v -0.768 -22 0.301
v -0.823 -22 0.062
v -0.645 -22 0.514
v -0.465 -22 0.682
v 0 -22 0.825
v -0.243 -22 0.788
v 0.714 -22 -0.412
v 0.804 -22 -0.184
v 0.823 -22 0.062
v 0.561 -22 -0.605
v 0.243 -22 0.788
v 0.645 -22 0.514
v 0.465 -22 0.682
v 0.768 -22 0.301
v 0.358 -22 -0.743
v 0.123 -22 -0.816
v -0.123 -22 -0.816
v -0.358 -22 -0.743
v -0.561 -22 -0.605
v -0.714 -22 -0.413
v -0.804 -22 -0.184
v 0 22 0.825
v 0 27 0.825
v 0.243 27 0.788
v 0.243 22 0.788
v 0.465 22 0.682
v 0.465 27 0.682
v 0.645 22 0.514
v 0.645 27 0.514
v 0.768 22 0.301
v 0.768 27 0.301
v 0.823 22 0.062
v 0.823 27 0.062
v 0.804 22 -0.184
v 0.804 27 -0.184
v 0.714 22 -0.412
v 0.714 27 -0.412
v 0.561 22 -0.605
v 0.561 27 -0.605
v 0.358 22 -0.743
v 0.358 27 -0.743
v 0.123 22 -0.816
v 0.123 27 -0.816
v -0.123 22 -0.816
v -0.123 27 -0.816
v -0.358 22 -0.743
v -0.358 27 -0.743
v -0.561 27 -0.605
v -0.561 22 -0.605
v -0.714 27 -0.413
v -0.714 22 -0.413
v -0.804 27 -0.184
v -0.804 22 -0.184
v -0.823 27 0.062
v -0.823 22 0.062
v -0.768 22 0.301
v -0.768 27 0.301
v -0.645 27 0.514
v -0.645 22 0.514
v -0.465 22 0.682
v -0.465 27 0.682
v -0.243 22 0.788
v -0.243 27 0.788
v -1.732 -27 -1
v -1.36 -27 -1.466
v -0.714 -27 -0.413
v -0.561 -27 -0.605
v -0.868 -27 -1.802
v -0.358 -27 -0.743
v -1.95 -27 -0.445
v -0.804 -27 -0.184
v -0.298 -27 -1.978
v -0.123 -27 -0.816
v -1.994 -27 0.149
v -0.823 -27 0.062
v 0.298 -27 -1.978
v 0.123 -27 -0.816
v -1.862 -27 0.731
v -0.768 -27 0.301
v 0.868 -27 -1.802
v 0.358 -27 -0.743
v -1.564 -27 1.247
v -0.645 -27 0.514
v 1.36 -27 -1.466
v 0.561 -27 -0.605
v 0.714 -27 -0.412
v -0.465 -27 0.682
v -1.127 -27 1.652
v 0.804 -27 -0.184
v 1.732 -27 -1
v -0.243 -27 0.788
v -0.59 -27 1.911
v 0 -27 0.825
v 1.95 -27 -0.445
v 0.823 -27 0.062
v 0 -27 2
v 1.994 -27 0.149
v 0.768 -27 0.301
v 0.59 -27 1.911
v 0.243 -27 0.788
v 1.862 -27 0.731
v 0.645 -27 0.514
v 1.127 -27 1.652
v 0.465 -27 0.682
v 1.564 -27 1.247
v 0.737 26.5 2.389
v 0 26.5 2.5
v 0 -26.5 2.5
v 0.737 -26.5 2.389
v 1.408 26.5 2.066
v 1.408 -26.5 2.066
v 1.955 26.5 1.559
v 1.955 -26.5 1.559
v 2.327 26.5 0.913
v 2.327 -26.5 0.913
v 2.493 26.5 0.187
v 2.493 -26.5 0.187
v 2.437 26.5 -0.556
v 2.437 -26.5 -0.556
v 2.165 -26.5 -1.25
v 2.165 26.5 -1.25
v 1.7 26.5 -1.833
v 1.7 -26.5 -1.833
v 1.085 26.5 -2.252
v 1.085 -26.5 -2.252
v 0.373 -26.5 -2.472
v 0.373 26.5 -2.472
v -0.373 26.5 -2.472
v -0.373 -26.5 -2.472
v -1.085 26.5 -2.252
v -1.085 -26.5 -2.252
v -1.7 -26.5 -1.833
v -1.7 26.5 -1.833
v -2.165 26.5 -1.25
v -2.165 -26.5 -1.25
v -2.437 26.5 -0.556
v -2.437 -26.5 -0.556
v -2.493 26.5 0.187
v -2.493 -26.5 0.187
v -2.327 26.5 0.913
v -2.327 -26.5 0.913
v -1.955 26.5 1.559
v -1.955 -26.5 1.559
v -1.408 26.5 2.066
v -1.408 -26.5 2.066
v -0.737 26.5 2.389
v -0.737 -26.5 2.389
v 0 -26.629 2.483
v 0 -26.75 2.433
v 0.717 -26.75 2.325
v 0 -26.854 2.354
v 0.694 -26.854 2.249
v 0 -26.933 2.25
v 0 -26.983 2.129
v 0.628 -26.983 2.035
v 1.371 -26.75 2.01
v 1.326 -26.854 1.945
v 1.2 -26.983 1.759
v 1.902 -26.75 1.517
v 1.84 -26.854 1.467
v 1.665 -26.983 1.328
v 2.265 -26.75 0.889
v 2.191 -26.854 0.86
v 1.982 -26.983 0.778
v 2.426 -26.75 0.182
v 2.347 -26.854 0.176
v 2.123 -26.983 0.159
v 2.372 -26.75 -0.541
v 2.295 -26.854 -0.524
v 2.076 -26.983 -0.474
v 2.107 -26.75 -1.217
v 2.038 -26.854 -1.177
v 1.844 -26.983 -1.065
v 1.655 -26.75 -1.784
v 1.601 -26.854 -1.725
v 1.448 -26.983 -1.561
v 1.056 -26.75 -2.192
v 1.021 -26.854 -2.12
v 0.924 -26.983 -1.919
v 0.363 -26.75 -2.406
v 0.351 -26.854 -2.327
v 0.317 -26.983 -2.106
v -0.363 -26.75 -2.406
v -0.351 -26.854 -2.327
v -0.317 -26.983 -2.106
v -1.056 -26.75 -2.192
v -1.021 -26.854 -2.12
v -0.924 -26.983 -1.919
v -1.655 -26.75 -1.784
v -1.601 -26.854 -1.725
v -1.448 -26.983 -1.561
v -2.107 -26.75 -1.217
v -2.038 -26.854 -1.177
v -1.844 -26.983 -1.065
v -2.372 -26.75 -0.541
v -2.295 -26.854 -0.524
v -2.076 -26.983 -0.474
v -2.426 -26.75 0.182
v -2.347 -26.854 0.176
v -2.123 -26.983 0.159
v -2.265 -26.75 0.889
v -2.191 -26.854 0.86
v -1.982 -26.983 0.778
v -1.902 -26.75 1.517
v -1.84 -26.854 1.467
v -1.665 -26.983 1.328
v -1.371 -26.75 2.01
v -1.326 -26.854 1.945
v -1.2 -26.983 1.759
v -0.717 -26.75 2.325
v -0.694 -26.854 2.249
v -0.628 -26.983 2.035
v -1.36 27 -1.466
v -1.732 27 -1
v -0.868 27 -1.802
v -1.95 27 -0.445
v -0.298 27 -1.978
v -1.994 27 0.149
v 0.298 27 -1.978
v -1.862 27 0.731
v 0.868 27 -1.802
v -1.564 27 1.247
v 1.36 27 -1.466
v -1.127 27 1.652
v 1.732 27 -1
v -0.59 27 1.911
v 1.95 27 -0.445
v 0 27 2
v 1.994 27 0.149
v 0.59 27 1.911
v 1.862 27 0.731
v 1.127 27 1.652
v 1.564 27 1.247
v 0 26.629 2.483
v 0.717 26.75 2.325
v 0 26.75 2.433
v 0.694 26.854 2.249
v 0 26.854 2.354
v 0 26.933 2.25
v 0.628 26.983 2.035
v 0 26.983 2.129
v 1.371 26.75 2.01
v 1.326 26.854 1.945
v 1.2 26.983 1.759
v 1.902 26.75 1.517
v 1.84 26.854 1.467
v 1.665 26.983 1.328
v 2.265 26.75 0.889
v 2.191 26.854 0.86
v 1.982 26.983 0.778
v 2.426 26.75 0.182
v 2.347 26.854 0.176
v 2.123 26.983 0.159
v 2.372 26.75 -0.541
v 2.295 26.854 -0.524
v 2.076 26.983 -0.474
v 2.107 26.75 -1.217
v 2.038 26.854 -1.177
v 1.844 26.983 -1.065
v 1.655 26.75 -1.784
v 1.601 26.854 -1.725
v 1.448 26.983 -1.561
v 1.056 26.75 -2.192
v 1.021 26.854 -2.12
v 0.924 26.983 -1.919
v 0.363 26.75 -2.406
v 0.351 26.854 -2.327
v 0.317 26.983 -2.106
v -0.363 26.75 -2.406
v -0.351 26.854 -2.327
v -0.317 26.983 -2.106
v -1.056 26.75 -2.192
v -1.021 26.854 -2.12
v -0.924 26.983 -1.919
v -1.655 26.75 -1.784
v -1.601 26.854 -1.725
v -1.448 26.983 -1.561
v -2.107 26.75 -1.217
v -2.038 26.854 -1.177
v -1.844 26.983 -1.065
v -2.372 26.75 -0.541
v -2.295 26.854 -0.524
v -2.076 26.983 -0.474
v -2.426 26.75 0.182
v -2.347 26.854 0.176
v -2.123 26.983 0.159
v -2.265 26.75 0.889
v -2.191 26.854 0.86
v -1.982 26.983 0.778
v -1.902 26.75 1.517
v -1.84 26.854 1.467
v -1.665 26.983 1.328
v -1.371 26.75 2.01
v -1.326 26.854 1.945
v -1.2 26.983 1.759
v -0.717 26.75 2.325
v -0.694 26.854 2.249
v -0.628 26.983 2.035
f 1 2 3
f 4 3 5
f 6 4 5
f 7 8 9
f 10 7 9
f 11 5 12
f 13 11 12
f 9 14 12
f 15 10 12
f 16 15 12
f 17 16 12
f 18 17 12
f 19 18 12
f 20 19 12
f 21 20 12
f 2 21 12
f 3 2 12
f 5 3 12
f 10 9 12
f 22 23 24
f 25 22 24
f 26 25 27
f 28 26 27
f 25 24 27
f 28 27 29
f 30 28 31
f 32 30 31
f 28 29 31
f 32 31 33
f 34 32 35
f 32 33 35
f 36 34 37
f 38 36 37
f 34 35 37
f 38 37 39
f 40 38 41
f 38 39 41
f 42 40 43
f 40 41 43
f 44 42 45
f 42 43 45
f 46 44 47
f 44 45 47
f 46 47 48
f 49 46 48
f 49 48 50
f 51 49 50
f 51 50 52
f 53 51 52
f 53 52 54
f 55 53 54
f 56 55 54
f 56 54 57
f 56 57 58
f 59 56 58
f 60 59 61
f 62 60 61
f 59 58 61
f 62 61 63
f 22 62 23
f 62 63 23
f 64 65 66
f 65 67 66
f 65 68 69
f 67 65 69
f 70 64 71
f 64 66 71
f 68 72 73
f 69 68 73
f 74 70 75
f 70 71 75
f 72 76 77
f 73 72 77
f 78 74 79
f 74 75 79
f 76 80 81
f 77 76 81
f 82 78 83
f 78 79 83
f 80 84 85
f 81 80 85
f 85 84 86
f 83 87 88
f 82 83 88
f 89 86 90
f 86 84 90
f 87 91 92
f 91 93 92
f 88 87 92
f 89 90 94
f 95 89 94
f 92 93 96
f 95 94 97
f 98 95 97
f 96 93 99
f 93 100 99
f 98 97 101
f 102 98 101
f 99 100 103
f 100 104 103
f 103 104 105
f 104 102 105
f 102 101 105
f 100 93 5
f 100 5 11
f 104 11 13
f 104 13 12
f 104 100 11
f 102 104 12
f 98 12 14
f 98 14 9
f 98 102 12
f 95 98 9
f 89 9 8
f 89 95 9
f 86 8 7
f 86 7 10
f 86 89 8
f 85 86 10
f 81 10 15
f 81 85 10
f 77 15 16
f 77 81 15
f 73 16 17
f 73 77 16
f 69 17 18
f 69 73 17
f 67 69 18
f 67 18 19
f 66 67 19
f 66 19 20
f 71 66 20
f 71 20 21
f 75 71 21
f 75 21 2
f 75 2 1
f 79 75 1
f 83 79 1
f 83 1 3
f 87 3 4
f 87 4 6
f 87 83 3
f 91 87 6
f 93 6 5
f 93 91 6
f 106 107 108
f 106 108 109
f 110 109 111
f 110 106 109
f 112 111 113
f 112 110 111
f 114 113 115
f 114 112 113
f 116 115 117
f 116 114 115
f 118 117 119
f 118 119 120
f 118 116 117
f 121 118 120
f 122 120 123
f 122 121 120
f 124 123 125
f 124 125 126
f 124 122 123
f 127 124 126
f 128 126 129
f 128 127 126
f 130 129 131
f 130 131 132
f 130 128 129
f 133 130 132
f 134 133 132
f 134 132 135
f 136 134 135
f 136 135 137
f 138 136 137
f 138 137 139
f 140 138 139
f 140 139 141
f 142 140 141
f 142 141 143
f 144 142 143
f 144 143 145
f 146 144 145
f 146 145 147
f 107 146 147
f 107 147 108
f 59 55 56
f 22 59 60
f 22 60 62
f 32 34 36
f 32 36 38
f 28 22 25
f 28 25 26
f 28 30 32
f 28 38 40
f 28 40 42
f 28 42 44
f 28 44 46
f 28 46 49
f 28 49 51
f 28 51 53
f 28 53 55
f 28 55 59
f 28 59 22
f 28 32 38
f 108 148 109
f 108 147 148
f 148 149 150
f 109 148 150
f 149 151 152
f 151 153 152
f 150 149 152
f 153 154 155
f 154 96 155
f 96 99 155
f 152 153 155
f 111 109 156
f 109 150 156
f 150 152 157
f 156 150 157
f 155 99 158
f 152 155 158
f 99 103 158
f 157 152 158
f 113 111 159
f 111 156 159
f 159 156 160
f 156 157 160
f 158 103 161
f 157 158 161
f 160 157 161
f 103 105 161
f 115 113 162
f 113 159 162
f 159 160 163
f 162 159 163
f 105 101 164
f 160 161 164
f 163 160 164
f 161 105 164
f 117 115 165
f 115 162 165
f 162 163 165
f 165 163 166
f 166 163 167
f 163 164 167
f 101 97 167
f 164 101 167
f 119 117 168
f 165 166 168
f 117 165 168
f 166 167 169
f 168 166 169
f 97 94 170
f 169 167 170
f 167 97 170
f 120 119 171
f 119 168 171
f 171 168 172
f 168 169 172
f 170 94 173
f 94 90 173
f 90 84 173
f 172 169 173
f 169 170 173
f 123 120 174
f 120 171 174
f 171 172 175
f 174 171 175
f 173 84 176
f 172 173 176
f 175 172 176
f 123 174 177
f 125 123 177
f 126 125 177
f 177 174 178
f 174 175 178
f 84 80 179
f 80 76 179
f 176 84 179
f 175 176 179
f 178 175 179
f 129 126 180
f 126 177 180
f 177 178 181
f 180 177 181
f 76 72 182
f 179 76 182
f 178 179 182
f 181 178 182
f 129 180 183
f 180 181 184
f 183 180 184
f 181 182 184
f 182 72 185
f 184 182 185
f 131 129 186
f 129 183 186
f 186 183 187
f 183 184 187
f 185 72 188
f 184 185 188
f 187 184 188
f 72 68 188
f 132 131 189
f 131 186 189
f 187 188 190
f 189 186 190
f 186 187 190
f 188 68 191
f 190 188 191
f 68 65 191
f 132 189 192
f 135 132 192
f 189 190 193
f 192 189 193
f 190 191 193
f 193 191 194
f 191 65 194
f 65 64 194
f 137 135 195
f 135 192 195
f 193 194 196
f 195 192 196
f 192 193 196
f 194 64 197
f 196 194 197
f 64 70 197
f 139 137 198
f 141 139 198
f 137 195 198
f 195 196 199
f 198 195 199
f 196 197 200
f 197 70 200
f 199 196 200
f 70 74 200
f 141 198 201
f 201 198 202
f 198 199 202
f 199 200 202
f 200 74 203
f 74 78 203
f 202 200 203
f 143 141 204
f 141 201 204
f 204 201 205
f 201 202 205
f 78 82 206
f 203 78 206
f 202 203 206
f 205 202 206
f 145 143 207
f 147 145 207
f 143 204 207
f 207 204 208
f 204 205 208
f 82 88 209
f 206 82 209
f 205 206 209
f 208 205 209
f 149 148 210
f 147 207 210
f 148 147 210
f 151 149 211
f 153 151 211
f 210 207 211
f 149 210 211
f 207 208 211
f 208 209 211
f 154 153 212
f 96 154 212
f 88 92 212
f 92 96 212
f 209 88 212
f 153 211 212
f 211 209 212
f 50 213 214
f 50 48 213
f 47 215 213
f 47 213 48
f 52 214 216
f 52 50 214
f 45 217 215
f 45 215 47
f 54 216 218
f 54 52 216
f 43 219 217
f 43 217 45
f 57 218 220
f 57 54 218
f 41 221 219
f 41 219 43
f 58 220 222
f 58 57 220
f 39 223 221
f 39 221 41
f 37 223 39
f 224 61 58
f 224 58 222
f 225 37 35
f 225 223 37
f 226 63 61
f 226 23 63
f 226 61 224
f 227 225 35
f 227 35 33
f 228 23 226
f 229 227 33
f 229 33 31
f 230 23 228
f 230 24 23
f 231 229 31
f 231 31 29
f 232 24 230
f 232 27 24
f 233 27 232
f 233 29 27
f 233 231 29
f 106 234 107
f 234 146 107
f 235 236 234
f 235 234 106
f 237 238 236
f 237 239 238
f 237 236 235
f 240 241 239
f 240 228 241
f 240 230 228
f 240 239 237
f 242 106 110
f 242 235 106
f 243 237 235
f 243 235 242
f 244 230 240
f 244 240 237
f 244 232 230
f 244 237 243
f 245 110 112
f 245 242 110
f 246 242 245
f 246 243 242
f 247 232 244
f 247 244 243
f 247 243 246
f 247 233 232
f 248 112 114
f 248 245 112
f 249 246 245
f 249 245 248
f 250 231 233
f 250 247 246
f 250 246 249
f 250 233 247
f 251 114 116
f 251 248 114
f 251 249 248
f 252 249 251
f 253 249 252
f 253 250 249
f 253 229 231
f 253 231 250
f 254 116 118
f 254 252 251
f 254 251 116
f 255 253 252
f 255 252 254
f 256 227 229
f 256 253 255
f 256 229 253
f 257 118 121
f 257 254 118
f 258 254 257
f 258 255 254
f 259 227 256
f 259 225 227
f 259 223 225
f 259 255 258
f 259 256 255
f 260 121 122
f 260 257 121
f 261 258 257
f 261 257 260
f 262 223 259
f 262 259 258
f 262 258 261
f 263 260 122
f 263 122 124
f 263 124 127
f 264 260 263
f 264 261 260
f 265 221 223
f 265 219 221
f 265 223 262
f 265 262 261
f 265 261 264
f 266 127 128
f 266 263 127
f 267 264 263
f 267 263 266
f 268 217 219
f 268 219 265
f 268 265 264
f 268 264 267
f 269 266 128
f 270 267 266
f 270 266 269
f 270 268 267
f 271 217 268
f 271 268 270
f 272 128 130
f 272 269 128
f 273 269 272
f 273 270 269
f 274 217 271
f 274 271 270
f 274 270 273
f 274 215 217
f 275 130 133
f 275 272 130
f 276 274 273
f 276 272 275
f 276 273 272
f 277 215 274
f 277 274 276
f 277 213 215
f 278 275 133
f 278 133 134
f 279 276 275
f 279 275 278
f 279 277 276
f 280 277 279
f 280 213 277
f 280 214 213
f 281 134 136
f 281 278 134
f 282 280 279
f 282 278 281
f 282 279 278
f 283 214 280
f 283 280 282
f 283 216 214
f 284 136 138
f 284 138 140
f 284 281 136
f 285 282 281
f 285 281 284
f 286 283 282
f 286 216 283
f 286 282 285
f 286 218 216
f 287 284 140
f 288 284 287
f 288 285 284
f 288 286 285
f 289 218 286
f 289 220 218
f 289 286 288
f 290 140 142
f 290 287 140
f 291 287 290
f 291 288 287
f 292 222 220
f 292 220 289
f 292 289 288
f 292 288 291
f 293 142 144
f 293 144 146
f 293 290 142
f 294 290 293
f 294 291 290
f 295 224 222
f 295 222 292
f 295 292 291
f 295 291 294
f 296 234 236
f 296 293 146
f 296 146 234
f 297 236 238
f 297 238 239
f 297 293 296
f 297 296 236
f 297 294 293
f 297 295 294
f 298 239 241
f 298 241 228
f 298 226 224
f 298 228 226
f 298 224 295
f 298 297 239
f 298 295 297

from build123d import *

# Parameters (mm, degrees)
SKETCH1_R            = 2.5
BOSS_EXTRUDE1_DEPTH  = 27
SKETCH2_R            = 0.825
CUT_EXTRUDE1_DEPTH   = 5
FILLET1_R            = 0.5
FILLET1_OF_MIRROR1_R = 0.5


with BuildPart() as part:
    # Sketch1 → Boss-Extrude1 (new body)
    with BuildSketch(Plane(origin=(0, 0, 0), x_dir=(1, 0, 0), z_dir=(0, 1, 0))):
        with Locations(Location((0, 0, 0), (0, 0, 270))):
            Circle(SKETCH1_R)
    boss_extrude1 = extrude(amount=BOSS_EXTRUDE1_DEPTH)

    # Sketch2 → Cut-Extrude1 (cut)
    with BuildSketch(Plane(origin=(0, 27, 0), x_dir=(1, 0, 0), z_dir=(0, 1, 0))):
        with Locations(Location((0, 0, 0), (0, 0, 270))):
            Circle(SKETCH2_R)
    cut_extrude1 = extrude(amount=-CUT_EXTRUDE1_DEPTH, mode=Mode.SUBTRACT)

    # Fillet1
    fillet1_edges = [part.edges().sort_by_distance(p)[0] for p in [
        (0, 27, -2.5),
    ]]
    fillet(fillet1_edges, radius=FILLET1_R)

    # Mirror1: Boss-Extrude1, Cut-Extrude1 across plane
    add(boss_extrude1.mirror(Plane.ZX))
    add(cut_extrude1.mirror(Plane.ZX), mode=Mode.SUBTRACT)

    # Fillet1 of Mirror1
    fillet1_of_mirror1_edges = [part.edges().sort_by_distance(p)[0] for p in [
        (0, -27, -2.5),
    ]]
    fillet(fillet1_of_mirror1_edges, radius=FILLET1_OF_MIRROR1_R)


solid = part.part
